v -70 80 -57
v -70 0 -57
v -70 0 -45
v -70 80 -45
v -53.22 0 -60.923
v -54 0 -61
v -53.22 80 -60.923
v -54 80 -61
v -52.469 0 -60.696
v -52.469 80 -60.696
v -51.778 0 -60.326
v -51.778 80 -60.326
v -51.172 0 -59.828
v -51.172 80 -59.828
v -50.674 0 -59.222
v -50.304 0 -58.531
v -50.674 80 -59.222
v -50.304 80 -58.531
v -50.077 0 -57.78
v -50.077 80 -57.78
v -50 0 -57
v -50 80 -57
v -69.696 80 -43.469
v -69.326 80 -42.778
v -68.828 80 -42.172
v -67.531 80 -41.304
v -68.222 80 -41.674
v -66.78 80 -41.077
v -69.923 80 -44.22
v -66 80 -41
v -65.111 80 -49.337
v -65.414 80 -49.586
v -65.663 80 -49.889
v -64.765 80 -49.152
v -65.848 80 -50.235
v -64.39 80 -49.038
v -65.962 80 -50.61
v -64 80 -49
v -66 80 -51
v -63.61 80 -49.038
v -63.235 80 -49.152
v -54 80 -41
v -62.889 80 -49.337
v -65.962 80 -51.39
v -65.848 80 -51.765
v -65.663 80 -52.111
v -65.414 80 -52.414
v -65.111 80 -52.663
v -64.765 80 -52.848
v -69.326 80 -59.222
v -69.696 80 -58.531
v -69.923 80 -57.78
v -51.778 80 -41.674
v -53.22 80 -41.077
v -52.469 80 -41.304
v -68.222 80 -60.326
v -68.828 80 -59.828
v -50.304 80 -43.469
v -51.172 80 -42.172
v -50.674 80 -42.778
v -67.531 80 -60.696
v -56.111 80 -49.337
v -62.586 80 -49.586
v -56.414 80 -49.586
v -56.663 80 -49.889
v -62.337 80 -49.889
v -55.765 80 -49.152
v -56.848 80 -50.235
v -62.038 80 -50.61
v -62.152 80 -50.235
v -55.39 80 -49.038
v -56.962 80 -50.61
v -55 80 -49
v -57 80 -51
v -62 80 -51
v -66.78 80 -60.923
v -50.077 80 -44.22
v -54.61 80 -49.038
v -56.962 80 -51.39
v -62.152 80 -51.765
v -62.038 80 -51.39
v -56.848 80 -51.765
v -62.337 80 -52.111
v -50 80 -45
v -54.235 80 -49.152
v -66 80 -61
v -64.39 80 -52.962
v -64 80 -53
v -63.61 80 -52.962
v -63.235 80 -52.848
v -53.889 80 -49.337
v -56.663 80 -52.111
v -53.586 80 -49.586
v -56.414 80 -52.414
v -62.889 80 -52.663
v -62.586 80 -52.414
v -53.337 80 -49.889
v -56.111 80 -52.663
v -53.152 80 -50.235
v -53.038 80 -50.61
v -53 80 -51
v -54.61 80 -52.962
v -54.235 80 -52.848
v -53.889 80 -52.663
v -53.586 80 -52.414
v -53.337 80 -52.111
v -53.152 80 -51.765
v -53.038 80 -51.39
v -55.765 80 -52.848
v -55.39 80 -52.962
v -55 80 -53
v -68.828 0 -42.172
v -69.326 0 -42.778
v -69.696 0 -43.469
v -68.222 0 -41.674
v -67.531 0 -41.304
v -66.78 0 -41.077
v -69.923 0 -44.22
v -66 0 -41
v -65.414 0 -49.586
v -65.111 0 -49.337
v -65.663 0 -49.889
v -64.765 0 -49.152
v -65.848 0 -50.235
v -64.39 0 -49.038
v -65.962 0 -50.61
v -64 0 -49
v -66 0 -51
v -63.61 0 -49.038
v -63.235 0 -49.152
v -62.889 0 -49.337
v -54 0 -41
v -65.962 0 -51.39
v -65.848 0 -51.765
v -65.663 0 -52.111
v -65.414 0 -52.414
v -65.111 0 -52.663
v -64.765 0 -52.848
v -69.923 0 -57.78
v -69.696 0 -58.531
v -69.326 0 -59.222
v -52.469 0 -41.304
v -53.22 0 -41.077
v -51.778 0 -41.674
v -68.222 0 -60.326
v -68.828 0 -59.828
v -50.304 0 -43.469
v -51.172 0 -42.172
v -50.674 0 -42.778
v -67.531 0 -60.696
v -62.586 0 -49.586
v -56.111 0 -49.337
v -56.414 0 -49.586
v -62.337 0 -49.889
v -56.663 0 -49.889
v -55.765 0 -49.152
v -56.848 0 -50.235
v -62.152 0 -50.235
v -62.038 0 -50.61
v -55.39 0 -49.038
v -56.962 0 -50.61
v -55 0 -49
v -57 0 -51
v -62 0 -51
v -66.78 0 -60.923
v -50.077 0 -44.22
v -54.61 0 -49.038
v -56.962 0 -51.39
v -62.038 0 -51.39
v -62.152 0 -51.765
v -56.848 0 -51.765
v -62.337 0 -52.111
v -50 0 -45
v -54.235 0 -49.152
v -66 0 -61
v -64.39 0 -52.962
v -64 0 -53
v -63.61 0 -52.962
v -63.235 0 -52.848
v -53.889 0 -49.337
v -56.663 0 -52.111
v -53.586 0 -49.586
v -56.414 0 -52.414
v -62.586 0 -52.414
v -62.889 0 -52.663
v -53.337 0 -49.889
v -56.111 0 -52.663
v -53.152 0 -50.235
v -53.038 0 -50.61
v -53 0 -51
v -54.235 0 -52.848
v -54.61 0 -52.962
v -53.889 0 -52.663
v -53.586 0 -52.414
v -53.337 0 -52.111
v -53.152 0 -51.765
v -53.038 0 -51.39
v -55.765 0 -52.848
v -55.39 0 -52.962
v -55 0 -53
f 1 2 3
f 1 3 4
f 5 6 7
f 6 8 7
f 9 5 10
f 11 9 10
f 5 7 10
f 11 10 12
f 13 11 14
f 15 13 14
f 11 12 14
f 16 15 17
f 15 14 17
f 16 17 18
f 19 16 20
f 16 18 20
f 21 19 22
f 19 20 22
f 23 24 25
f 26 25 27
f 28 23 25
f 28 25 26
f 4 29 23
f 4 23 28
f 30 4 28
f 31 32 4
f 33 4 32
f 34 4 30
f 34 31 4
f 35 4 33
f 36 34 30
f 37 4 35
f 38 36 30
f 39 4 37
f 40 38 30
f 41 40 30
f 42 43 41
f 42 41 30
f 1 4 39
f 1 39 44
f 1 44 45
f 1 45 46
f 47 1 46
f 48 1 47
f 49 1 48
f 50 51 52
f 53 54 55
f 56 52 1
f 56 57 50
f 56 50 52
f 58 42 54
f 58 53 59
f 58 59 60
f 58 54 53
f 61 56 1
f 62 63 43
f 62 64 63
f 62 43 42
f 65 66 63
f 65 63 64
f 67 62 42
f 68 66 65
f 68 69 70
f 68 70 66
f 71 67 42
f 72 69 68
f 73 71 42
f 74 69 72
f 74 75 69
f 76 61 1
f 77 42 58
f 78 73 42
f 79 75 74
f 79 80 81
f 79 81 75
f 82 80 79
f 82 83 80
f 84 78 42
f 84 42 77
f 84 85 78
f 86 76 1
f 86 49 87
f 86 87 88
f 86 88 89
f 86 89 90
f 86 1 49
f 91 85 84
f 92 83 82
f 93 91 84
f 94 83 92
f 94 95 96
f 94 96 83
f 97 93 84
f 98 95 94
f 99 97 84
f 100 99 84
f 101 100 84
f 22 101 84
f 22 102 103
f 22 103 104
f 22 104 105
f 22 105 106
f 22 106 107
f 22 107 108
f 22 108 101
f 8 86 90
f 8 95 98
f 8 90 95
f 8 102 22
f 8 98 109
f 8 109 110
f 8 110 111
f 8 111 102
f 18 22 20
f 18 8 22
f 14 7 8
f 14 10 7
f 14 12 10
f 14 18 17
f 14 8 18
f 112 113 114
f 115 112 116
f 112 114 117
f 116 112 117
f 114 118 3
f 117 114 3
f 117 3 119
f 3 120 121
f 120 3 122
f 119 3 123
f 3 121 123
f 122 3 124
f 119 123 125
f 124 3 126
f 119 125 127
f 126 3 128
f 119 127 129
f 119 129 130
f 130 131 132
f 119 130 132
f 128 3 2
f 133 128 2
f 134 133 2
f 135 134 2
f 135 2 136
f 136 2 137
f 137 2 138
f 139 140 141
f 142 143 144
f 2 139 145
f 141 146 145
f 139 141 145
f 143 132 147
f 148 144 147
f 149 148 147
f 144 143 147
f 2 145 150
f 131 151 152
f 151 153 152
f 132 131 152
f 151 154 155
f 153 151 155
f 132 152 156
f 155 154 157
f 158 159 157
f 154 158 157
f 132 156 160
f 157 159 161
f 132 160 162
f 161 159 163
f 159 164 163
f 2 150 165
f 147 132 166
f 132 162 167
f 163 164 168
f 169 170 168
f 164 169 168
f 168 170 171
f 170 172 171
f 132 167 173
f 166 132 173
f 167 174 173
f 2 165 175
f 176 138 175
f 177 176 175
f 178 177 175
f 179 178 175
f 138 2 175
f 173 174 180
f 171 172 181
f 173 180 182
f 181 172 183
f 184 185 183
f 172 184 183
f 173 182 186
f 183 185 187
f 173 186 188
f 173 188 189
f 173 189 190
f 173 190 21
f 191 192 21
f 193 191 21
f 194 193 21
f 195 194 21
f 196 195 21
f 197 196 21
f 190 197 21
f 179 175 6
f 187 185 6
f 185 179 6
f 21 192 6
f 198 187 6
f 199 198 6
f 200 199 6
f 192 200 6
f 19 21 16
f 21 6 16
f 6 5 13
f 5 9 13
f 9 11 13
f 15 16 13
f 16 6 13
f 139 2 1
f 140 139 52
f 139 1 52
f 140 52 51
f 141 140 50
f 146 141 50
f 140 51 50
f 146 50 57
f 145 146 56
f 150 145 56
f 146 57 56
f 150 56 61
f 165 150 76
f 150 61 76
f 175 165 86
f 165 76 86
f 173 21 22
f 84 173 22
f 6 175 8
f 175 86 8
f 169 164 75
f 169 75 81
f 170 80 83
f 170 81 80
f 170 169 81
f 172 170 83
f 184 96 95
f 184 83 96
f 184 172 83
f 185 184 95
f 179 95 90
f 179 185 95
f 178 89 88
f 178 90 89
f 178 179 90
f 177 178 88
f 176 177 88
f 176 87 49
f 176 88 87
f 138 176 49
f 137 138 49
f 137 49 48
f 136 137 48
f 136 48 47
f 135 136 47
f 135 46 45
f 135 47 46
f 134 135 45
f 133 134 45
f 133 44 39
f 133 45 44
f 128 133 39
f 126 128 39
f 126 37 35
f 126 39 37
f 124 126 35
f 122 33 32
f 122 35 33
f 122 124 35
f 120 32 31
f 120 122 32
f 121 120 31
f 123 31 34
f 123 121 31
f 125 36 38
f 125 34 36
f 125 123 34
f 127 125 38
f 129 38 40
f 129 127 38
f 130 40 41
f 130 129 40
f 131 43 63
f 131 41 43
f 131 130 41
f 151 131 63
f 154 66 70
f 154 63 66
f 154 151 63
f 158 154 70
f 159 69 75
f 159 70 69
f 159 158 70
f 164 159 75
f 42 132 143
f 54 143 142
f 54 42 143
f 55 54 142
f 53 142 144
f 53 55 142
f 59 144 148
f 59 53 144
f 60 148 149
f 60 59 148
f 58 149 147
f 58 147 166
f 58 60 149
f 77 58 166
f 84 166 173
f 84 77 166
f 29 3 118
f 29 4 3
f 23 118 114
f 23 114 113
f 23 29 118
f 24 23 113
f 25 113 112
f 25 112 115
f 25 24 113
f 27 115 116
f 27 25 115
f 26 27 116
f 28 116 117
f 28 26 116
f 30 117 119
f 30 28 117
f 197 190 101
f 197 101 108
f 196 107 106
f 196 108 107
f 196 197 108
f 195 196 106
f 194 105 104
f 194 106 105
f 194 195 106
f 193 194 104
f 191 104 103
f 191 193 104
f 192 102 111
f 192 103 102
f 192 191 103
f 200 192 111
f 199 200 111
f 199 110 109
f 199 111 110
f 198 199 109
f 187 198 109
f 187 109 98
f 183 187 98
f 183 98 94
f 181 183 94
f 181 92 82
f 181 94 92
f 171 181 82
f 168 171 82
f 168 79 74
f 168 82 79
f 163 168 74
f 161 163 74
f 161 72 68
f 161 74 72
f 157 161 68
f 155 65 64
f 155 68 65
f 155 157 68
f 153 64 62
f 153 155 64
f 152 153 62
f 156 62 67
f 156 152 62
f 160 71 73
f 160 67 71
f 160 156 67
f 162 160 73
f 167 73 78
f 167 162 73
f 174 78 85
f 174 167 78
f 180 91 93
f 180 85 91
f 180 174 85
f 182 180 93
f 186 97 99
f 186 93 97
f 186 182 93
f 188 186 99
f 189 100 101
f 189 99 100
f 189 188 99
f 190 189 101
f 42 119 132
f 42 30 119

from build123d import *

# Parameters (mm, degrees)
CYLINDER050_R       = 2
CYLINDER050_DEPTH   = 100
ARRAY001028_X_COUNT = 2
ARRAY001028_X_PITCH = 9
BOX028_W            = 20
BOX028_H            = 80
BOX028_DEPTH        = 20
FILLET_R            = 4


with BuildPart() as stand_attachment_hole_fusion001:
    # Cylinder050 → Cylinder050 (new body)
    with BuildSketch(Plane(origin=(0, -10, 10), x_dir=(1, 0, 0), z_dir=(0, 1, 0))):
        Circle(CYLINDER050_R)
    extrude(amount=CYLINDER050_DEPTH)

    # Array001028 X: stand attachment hole fusion001 ×2


with BuildPart() as stand_attachment_hole_fusion001_1:
    add(stand_attachment_hole_fusion001.part)
    with Locations(*[(i * ARRAY001028_X_PITCH, 0, 0) for i in range(1, ARRAY001028_X_COUNT)]):
        add(stand_attachment_hole_fusion001.part)


with BuildPart() as stand_attachment_middle_fillet:
    # Box028 → Box028 (new body)
    with BuildSketch(Plane(origin=(-6, 0, 0), x_dir=(1, 0, 0), z_dir=(0, 0, 1))):
        with Locations((10, 40)):
            Rectangle(BOX028_W, BOX028_H)
    extrude(amount=BOX028_DEPTH)

    # Cut020: cut stand attachment hole fusion001
    add(stand_attachment_hole_fusion001_1.part, mode=Mode.SUBTRACT)


with BuildPart() as stand_attachment_middle_fillet_1:
    # Cut020 placement: moved
    add(stand_attachment_middle_fillet.part.moved(Location((-64, 0, -61))))

    # Fillet
    fillet_edges = [stand_attachment_middle_fillet_1.edges().sort_by_distance(p)[0] for p in [
        (-70, 40, -41),
        (-70, 40, -61),
        (-50, 40, -41),
        (-50, 40, -61),
    ]]
    fillet(fillet_edges, radius=FILLET_R)


solid = stand_attachment_middle_fillet_1.part
